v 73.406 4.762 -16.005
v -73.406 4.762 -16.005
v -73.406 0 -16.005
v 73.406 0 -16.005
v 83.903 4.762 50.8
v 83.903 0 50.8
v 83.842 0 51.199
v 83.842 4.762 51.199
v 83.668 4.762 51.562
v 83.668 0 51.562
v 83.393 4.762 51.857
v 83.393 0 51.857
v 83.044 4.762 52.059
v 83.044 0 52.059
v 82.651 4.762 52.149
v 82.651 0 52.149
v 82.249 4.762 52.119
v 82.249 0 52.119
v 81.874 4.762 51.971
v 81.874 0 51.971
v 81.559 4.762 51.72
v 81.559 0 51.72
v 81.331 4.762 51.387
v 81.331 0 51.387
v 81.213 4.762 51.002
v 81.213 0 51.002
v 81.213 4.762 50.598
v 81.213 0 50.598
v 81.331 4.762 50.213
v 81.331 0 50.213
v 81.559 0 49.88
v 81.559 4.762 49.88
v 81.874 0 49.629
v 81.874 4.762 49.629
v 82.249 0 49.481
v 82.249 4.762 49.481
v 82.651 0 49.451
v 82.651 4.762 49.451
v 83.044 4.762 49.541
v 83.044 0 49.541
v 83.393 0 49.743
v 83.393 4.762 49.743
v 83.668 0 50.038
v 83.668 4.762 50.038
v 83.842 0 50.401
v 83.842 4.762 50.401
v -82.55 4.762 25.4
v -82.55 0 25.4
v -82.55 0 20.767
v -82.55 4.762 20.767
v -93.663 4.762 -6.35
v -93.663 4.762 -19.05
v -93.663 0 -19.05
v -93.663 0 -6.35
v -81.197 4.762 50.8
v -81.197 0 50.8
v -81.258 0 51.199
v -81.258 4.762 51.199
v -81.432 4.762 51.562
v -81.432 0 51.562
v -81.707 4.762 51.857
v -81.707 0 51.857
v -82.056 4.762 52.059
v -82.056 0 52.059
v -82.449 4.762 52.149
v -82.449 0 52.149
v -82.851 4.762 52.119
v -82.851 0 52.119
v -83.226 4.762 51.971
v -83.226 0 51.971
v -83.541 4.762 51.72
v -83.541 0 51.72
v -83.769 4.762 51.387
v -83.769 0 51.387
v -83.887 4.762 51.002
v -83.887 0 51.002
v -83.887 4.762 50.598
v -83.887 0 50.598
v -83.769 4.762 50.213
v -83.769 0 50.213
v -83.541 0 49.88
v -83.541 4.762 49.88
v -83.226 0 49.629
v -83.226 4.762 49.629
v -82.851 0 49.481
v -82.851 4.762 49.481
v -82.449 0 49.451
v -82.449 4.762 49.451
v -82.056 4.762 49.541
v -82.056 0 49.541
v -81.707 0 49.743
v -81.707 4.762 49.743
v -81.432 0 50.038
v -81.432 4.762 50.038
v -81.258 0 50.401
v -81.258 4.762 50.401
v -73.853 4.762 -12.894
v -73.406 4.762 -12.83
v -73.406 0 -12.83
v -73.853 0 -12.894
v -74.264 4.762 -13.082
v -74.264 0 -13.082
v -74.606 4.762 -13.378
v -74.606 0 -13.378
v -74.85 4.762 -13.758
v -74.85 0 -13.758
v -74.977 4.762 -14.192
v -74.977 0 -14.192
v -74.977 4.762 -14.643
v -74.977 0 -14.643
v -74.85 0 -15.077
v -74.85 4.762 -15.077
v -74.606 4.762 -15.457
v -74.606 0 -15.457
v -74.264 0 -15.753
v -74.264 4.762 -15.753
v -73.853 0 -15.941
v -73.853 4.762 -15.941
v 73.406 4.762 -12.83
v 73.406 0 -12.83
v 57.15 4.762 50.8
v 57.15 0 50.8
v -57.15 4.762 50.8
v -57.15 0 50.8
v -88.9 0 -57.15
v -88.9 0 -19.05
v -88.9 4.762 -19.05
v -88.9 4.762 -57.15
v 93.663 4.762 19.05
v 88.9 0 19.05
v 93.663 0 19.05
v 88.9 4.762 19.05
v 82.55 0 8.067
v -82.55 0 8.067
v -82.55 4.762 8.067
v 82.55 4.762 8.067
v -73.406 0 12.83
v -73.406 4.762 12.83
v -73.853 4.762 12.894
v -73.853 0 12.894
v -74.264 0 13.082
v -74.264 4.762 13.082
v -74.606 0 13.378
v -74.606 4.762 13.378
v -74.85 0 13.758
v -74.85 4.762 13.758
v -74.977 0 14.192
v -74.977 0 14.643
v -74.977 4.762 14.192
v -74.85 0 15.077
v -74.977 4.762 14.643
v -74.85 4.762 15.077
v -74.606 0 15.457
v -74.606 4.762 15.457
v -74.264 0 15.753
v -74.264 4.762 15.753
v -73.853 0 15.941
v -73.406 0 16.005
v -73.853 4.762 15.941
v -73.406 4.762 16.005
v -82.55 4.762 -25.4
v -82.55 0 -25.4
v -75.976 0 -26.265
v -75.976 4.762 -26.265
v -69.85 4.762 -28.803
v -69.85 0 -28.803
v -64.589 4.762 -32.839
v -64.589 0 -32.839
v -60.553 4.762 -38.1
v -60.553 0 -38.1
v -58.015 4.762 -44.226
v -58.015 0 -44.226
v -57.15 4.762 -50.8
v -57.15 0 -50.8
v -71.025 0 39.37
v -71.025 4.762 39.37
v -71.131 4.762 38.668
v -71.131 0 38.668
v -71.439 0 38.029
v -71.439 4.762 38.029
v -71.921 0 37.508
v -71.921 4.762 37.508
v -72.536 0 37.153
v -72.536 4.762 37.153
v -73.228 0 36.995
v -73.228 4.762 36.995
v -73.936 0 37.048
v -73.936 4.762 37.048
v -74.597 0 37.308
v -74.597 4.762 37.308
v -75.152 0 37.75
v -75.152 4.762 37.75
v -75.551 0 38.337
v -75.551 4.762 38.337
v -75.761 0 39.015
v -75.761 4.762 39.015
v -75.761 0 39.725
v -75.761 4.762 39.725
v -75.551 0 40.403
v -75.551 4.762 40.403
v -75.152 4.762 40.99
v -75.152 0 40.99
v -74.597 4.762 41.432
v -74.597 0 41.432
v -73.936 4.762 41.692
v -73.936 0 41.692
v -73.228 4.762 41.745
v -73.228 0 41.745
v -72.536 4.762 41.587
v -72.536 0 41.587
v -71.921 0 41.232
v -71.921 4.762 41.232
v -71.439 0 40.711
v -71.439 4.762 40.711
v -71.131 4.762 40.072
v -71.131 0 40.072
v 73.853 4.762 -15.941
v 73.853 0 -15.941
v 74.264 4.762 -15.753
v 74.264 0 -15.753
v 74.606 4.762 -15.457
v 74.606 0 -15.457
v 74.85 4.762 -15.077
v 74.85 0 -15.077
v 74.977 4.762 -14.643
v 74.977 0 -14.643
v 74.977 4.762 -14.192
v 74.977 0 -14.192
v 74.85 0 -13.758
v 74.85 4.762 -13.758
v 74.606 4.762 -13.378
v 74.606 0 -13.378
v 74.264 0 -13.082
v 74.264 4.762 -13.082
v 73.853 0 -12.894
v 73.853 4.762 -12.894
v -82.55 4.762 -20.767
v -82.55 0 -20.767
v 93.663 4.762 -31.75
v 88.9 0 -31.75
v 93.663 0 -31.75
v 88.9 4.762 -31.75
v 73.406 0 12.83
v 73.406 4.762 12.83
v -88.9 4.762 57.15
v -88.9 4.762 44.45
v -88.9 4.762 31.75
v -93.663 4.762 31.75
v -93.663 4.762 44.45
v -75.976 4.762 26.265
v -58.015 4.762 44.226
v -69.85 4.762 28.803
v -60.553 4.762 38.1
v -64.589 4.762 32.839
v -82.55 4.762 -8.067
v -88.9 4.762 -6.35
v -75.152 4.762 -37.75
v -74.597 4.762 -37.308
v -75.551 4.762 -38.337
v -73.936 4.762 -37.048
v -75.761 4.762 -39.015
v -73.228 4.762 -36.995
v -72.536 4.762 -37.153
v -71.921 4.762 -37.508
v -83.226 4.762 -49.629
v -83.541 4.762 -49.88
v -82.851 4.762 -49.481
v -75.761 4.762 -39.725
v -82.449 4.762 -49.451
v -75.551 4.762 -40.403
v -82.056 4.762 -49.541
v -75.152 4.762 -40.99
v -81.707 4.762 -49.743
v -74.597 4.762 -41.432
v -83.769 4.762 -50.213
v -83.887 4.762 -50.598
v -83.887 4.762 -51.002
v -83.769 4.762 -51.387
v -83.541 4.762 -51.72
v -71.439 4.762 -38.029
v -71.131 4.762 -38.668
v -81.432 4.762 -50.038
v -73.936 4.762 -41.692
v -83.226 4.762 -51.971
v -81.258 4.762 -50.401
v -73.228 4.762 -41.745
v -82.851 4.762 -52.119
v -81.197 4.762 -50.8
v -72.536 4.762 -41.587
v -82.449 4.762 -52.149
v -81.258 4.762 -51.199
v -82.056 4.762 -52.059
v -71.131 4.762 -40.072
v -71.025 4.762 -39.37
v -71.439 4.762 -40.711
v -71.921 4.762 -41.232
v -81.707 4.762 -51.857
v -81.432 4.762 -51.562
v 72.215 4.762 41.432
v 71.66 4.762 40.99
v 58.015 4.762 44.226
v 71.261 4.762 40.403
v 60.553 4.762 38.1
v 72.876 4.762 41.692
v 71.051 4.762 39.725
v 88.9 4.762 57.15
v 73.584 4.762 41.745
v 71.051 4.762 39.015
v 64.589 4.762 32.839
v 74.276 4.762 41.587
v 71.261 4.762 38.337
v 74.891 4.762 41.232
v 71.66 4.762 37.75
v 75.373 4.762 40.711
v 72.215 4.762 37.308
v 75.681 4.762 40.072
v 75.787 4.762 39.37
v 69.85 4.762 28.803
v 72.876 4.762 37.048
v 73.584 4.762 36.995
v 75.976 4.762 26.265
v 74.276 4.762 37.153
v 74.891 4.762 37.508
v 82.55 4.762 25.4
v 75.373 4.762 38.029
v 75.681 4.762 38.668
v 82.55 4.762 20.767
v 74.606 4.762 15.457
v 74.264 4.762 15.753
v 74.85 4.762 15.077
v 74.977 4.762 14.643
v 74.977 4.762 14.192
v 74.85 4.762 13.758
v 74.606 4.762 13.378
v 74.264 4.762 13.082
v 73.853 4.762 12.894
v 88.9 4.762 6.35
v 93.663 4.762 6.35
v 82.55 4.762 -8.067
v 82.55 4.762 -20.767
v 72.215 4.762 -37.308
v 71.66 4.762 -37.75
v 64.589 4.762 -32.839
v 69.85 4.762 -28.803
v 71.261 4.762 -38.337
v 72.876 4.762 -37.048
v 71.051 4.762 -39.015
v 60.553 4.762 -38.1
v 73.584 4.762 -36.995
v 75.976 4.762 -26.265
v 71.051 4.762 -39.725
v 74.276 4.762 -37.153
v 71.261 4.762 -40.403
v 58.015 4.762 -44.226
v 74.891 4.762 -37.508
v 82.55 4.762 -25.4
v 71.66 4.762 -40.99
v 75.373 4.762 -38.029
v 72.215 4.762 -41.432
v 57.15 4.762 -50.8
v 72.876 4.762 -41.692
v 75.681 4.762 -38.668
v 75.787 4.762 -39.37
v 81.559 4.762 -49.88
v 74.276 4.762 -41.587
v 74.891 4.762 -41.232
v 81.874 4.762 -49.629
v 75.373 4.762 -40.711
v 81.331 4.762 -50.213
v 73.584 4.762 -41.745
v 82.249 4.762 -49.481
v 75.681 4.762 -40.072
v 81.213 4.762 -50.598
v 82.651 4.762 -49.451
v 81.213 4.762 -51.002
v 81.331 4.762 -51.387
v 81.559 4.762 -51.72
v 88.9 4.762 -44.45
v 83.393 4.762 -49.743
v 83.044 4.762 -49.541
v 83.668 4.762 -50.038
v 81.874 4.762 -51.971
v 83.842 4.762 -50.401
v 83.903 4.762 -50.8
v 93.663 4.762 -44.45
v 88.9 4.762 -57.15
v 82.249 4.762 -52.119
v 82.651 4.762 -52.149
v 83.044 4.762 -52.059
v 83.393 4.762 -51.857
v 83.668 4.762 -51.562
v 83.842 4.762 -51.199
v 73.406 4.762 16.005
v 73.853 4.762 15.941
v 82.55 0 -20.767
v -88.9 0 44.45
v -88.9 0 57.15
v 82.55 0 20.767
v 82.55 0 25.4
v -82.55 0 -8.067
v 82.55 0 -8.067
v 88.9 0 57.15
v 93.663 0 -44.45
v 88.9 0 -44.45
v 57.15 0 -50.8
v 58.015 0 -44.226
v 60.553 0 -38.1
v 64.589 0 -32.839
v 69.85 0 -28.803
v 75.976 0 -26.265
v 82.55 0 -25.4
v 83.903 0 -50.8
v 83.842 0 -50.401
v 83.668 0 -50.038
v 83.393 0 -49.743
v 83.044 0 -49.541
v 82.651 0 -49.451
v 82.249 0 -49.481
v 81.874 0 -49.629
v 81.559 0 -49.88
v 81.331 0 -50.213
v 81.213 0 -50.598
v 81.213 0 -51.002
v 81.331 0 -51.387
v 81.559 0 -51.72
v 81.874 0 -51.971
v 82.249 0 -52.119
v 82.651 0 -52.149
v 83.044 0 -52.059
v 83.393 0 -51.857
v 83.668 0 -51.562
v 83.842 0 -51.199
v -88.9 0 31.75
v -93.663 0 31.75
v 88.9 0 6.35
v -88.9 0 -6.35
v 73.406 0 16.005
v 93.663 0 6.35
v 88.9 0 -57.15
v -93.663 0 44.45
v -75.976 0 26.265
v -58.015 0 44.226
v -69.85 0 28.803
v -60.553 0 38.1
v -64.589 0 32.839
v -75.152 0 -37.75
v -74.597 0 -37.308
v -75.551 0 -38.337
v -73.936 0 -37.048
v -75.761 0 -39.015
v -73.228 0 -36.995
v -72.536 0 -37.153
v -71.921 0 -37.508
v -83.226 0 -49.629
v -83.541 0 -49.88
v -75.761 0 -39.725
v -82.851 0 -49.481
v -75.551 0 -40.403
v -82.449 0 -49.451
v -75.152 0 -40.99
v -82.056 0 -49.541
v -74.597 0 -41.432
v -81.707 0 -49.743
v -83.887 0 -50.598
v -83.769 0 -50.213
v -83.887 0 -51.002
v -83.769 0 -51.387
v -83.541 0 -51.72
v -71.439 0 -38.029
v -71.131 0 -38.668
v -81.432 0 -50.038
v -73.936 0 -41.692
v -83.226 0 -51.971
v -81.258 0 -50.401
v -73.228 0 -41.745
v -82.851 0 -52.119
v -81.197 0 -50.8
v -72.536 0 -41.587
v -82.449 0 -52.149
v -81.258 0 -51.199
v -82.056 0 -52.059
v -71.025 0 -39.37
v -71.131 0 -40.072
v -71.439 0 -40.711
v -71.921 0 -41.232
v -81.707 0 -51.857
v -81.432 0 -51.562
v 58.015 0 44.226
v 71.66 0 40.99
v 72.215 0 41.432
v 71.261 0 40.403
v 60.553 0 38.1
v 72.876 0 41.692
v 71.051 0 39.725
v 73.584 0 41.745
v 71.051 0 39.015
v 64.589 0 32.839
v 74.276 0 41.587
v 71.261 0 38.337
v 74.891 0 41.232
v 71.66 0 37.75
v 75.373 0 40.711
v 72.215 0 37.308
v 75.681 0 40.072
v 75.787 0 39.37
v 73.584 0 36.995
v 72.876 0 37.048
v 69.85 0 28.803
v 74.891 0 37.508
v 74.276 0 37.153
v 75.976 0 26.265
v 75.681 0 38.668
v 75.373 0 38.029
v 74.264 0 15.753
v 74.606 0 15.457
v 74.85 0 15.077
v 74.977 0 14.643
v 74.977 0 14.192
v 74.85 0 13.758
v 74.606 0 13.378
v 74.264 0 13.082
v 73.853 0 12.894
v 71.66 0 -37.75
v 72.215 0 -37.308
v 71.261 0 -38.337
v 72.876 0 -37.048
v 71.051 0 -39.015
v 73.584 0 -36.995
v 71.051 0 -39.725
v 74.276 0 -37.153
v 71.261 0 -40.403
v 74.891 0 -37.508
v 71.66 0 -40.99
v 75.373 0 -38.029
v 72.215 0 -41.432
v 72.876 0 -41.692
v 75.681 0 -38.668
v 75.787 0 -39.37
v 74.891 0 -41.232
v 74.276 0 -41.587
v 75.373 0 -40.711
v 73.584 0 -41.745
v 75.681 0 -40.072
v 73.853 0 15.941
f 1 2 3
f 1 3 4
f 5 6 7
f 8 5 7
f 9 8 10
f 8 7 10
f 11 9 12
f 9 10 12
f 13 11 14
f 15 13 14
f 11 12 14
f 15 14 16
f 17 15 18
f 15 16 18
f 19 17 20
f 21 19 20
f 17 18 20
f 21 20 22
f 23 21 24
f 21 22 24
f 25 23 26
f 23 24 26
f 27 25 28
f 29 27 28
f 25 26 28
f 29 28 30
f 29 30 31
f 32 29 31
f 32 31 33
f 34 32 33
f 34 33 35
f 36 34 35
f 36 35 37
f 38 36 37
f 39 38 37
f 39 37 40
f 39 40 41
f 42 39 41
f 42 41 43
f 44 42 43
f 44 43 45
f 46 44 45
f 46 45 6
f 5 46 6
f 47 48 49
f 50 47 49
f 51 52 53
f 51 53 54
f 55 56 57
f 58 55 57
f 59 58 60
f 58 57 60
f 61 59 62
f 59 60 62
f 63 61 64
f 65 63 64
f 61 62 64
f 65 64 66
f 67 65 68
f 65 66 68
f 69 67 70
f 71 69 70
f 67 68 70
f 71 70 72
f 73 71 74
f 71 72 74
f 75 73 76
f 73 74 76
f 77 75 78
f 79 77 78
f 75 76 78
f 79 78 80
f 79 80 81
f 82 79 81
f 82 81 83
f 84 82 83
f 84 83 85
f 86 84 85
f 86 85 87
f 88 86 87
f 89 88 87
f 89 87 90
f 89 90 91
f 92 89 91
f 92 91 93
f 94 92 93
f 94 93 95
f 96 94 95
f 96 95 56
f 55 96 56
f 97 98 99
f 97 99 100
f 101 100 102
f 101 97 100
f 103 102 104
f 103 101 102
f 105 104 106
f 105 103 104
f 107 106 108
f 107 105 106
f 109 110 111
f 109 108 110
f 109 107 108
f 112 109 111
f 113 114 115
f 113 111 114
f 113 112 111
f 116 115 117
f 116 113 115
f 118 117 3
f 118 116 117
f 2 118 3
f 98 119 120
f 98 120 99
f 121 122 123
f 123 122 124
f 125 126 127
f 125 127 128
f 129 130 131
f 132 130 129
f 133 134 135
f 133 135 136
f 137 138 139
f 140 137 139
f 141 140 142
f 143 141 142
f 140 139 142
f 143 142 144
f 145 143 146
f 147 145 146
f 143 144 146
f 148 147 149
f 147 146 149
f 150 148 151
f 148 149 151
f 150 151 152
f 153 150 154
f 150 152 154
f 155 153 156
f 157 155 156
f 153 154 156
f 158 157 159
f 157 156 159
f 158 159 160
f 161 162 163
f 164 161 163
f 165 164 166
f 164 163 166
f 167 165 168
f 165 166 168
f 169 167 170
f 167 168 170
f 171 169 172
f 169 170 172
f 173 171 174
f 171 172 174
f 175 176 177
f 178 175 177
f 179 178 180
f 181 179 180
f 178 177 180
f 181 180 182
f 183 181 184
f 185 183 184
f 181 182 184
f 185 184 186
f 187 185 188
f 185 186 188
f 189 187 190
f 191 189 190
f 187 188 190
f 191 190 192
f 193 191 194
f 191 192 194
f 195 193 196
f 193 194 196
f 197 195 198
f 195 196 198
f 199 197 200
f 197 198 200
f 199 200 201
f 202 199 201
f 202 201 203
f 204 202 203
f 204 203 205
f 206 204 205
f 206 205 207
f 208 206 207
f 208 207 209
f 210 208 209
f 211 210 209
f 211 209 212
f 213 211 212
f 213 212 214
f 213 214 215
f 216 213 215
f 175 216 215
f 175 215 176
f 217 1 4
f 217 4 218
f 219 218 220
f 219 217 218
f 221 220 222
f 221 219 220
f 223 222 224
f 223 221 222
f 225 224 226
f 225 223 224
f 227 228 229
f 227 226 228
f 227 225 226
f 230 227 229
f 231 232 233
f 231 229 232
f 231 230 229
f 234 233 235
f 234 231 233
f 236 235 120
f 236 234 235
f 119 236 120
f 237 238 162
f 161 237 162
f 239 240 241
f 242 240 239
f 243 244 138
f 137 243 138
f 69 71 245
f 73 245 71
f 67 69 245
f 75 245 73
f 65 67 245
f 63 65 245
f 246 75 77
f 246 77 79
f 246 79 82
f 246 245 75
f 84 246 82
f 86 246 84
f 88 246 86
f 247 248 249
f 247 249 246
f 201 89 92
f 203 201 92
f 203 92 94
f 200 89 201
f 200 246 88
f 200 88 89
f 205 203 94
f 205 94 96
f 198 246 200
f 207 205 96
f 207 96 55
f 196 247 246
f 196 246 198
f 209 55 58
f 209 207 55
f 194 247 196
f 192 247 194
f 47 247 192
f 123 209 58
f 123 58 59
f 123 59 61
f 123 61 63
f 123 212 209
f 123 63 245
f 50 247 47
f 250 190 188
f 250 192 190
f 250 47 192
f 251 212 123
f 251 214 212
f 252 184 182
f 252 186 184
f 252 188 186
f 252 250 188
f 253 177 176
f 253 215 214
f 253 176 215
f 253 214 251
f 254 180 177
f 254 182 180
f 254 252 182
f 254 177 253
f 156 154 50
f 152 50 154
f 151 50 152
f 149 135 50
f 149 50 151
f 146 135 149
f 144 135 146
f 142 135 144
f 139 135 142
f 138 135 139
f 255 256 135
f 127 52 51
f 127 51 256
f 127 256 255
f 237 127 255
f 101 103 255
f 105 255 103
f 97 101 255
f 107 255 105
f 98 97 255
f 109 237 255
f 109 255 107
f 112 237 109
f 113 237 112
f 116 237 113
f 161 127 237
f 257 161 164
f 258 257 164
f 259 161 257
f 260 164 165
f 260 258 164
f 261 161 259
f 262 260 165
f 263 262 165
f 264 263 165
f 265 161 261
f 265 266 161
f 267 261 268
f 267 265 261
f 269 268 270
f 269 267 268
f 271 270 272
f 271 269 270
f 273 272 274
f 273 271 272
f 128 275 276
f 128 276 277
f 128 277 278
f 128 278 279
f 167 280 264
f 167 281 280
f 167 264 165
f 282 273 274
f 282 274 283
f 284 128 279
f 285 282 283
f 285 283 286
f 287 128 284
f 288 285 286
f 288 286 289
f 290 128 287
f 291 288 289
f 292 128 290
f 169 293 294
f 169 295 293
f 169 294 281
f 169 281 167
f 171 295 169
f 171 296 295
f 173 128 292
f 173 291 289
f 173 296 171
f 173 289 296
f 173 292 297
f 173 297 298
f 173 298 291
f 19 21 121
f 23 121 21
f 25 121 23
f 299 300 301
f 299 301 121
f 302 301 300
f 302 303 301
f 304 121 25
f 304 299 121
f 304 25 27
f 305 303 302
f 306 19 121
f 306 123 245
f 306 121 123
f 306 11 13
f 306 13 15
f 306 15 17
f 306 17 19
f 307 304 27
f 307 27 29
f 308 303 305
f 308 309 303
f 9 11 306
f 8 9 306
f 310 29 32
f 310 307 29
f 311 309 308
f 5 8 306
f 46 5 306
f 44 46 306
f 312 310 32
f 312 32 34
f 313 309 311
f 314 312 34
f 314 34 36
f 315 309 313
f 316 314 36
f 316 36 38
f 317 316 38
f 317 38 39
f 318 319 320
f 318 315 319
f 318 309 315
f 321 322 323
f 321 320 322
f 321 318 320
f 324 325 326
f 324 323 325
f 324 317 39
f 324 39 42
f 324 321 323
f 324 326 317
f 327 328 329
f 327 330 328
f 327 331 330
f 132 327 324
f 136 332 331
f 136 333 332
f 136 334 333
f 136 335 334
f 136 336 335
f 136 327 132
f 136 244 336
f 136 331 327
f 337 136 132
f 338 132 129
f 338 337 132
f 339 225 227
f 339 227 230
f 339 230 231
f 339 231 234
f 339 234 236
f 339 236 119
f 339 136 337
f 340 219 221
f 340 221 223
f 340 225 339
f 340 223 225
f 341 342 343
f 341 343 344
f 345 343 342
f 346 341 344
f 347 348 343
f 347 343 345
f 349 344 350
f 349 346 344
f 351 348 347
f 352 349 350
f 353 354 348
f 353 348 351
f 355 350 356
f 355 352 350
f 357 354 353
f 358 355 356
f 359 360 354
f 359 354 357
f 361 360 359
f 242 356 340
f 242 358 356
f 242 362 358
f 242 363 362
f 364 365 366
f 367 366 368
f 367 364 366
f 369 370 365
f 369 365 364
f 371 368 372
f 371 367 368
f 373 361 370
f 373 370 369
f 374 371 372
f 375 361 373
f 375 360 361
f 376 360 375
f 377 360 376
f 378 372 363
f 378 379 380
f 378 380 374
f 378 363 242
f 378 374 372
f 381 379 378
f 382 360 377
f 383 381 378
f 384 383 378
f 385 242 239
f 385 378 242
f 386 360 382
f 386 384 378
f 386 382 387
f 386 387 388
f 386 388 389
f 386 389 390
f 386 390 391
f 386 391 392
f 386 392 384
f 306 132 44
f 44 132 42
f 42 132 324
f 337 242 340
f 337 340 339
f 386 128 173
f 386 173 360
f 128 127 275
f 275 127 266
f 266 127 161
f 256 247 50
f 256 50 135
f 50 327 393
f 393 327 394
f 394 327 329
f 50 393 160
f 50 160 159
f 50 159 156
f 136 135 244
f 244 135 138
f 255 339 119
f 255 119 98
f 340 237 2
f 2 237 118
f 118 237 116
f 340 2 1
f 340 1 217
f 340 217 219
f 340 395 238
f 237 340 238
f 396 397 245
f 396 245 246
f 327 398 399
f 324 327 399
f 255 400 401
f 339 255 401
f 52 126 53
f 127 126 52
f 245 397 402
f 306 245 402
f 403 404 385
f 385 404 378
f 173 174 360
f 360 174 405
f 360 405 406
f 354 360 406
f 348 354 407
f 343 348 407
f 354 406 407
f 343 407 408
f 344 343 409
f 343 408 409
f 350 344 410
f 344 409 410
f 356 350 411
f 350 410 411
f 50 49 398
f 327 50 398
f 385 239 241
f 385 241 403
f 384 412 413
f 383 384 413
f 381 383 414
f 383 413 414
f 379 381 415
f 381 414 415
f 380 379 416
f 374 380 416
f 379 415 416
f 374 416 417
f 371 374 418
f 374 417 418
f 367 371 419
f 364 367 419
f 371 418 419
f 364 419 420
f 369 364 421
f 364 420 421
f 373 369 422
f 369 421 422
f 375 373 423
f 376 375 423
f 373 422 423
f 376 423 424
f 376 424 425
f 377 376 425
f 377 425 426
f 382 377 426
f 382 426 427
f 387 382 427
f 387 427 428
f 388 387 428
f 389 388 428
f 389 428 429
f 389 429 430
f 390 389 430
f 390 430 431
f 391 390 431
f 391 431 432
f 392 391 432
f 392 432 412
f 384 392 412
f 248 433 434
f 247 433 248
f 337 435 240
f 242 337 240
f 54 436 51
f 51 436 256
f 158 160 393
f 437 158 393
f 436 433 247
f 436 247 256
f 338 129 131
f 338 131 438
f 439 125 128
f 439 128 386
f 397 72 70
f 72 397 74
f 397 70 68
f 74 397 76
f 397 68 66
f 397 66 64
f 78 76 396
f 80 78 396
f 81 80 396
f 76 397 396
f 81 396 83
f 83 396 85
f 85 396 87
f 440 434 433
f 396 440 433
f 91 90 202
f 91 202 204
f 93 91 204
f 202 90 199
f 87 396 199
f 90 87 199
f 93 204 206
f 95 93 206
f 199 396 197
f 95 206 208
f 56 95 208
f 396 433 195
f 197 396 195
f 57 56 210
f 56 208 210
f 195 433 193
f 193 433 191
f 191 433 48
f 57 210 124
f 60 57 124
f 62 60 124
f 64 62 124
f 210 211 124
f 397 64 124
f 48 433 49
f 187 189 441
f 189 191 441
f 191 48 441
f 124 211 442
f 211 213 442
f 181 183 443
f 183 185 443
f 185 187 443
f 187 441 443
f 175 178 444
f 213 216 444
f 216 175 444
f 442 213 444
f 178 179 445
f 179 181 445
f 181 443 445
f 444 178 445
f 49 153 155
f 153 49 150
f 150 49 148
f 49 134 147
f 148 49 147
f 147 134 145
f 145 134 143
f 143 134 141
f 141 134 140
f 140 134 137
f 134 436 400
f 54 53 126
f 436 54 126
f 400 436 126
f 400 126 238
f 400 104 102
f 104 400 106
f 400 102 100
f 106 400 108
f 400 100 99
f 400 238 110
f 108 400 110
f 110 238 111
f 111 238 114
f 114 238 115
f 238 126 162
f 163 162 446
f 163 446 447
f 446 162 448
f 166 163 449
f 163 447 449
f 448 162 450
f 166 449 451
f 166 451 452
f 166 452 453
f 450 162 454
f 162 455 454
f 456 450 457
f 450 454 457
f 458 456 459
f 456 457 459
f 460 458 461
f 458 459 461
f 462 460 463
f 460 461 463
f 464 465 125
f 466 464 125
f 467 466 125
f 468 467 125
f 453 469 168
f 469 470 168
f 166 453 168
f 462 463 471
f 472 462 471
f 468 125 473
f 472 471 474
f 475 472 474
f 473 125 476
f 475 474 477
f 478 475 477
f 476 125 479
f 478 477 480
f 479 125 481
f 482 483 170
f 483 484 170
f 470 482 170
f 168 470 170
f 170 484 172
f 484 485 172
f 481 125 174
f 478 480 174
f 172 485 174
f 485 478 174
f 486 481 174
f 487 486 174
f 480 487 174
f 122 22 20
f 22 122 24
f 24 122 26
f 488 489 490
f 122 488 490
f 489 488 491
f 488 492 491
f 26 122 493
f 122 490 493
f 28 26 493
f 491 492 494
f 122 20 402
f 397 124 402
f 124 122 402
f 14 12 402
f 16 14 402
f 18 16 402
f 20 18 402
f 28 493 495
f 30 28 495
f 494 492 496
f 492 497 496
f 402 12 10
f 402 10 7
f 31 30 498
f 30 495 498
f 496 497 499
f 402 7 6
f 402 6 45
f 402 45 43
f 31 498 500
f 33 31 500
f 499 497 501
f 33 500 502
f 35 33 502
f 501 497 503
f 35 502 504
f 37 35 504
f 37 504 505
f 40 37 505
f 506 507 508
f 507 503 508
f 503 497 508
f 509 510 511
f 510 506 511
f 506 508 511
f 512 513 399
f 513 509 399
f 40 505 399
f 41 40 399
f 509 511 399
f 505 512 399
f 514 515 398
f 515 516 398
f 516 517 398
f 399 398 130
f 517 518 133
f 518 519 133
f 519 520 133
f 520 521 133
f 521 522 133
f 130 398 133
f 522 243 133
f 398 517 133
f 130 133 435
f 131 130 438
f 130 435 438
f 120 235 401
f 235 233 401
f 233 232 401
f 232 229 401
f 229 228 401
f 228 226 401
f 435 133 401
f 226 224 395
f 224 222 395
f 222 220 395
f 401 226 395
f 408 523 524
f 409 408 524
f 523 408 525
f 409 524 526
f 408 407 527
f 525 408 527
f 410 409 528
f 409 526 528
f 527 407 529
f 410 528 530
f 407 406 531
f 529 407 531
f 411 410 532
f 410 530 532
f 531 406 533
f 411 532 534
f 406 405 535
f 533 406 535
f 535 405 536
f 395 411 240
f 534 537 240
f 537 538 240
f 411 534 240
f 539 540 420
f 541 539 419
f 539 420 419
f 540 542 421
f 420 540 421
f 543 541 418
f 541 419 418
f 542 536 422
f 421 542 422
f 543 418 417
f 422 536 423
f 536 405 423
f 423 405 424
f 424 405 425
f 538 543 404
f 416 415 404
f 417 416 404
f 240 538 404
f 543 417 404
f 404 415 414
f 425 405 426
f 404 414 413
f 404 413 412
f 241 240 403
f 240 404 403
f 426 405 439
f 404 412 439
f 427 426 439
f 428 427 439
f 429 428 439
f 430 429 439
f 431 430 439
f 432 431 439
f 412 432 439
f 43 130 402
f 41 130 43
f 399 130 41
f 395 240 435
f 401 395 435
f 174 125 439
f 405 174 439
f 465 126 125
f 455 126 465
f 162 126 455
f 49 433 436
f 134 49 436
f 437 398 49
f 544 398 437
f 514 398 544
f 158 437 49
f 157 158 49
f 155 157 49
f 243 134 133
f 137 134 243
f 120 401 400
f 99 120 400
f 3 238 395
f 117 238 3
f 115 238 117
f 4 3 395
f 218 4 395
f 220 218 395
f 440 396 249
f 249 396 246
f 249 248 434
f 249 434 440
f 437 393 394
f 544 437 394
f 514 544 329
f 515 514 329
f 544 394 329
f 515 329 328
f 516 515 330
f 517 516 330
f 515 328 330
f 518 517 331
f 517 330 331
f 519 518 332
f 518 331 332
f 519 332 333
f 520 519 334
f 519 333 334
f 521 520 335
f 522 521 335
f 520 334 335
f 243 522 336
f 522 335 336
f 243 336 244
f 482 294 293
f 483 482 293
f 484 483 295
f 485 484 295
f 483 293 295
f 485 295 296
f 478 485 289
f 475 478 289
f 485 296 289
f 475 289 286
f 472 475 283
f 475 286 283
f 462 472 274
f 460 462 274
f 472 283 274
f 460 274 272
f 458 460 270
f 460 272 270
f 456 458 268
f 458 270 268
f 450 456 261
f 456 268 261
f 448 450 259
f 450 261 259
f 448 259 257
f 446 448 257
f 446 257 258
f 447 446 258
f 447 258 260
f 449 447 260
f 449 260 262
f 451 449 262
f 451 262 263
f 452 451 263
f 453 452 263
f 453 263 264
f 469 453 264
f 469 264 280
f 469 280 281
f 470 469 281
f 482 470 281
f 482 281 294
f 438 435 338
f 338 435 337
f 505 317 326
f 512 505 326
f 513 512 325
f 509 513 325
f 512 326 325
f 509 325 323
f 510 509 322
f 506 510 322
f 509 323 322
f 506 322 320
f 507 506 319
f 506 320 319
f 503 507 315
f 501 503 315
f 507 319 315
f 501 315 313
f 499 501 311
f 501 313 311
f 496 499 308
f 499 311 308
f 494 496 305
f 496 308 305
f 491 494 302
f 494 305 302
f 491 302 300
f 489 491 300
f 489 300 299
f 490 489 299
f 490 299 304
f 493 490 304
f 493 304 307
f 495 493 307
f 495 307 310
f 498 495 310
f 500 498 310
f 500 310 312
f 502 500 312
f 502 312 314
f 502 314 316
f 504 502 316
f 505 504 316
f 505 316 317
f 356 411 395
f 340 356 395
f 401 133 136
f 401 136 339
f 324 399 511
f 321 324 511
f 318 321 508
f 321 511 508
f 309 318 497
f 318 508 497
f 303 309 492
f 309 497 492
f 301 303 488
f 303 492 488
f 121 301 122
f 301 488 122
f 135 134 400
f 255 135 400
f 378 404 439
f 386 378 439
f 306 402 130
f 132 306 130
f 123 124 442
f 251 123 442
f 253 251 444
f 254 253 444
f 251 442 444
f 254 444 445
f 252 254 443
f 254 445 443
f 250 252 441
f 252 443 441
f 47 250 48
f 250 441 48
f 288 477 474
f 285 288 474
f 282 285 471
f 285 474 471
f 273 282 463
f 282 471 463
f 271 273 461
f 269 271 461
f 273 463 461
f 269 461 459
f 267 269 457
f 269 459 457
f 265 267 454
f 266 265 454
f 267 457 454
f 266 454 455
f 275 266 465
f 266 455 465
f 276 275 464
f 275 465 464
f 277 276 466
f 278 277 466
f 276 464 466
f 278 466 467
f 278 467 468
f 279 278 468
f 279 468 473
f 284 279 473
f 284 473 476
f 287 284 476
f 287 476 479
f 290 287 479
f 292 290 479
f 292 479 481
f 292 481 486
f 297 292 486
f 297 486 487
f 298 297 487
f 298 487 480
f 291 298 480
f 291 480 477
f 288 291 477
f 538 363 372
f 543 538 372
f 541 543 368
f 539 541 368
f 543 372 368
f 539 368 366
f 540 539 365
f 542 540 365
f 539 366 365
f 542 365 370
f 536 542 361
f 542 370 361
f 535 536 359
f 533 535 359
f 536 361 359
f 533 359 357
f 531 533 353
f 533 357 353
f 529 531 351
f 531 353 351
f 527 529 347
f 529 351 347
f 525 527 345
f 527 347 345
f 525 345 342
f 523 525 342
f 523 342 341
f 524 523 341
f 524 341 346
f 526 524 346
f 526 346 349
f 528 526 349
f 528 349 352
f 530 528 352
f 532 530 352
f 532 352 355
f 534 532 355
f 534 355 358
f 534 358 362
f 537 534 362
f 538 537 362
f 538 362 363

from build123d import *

# Parameters (mm, degrees)
SKETCH1_W             = 177.8
SKETCH1_H             = 114.3
SKETCH1_W_2           = 165.1
SKETCH1_H_2           = 16.134929366
BOSS_EXTRUDE1_DEPTH   = 4.7625
CUT_EXTRUDE1_DEPTH    = 5.7625
SKETCH4_R             = 2.38125
CUT_EXTRUDE2_DEPTH    = 5.7625
F_6_32_TAPPED_HOLE1_D = 2.7051
SKETCH7_W             = 12.7
SKETCH7_H             = 4.7625
BOSS_EXTRUDE2_DEPTH   = 4.7625
SKETCH8_W             = 12.7
SKETCH8_H             = 4.7625
BOSS_EXTRUDE3_DEPTH   = 4.7625


with BuildPart() as part:
    # Sketch1 → Boss-Extrude1 (new body)
    with BuildSketch(Plane(origin=(0, 0, 0), x_dir=(1, 0, 0), z_dir=(0, 1, 0))):
        Rectangle(SKETCH1_W, SKETCH1_H)
        with BuildLine():
            Line((-82.55, -25.4), (-82.55, -20.767464683))
            Line((-82.55, -20.767464683), (82.55, -20.767464683))
            Line((82.55, -20.767464683), (82.55, -25.4))
            ThreePointArc((82.55, -25.4), (64.589487758, -32.839487758), (57.15, -50.8))
            Line((57.15, -50.8), (-57.15, -50.8))
            ThreePointArc((-57.15, -50.8), (-64.589487758, -32.839487758), (-82.55, -25.4))
        make_face(mode=Mode.SUBTRACT)
        Rectangle(SKETCH1_W_2, SKETCH1_H_2, mode=Mode.SUBTRACT)
        with BuildLine():
            Line((82.55, 20.767464683), (-82.55, 20.767464683))
            Line((-82.55, 20.767464683), (-82.55, 25.4))
            ThreePointArc((-82.55, 25.4), (-64.589487758, 32.839487758), (-57.15, 50.8))
            Line((-57.15, 50.8), (57.15, 50.8))
            ThreePointArc((57.15, 50.8), (64.589487758, 32.839487758), (82.55, 25.4))
            Line((82.55, 25.4), (82.55, 20.767464683))
        make_face(mode=Mode.SUBTRACT)
    extrude(amount=BOSS_EXTRUDE1_DEPTH)

    # Sketch3 → Cut-Extrude1 (cut, through all)
    with BuildSketch(Plane(origin=(0, 4.7625, 0), x_dir=(1, 0, 0), z_dir=(0, 1, 0))):
        with BuildLine():
            Line((-73.406, 16.004964683), (73.406, 16.004964683))
            ThreePointArc((73.406, 16.004964683), (74.9935, 14.417464683), (73.406, 12.829964683))
            Line((73.406, 12.829964683), (-73.406, 12.829964683))
            ThreePointArc((-73.406, 12.829964683), (-74.9935, 14.417464683), (-73.406, 16.004964683))
        make_face()
        with BuildLine():
            Line((-73.406, -16.004964683), (73.406, -16.004964683))
            ThreePointArc((73.406, -16.004964683), (74.9935, -14.417464683), (73.406, -12.829964683))
            Line((73.406, -12.829964683), (-73.406, -12.829964683))
            ThreePointArc((-73.406, -12.829964683), (-74.9935, -14.417464683), (-73.406, -16.004964683))
        make_face()
    extrude(amount=-CUT_EXTRUDE1_DEPTH, mode=Mode.SUBTRACT)

    # Sketch4 → Cut-Extrude2 (cut, through all)
    with BuildSketch(Plane(origin=(0, 4.7625, 0), x_dir=(1, 0, 0), z_dir=(0, 1, 0))):
        with Locations((-73.406, 39.37)):
            Circle(SKETCH4_R)
        with Locations((-73.406, -39.37)):
            Circle(SKETCH4_R)
        with Locations((73.406, -39.37)):
            Circle(SKETCH4_R)
        with Locations((73.406, 39.37)):
            Circle(SKETCH4_R)
    extrude(amount=-CUT_EXTRUDE2_DEPTH, mode=Mode.SUBTRACT)

    # #6-32 Tapped Hole1 (through all)
    with Locations(Plane(origin=(0, 6.2865, 0), x_dir=(-1, 0, 0), z_dir=(0, 1, 0))):
        with Locations((82.55, -50.8), (82.55, 50.8), (-82.55, 50.8), (-82.55, -50.8)):
            Hole(F_6_32_TAPPED_HOLE1_D / 2)

    # Sketch7 → Boss-Extrude2 (add)
    with BuildSketch(Plane.ZY.offset(88.9)):
        with Locations((-12.7, 2.38125)):
            Rectangle(SKETCH7_W, SKETCH7_H)
        with Locations((38.1, 2.38125)):
            Rectangle(SKETCH7_W, SKETCH7_H)
    extrude(amount=BOSS_EXTRUDE2_DEPTH)

    # Sketch8 → Boss-Extrude3 (add)
    with BuildSketch(Plane(origin=(88.9, 0, 0), x_dir=(0, 0, -1), z_dir=(1, 0, 0))):
        with Locations((-12.7, 2.38125)):
            Rectangle(SKETCH8_W, SKETCH8_H)
        with Locations((38.1, 2.38125)):
            Rectangle(SKETCH8_W, SKETCH8_H)
    extrude(amount=BOSS_EXTRUDE3_DEPTH)


solid = part.part
